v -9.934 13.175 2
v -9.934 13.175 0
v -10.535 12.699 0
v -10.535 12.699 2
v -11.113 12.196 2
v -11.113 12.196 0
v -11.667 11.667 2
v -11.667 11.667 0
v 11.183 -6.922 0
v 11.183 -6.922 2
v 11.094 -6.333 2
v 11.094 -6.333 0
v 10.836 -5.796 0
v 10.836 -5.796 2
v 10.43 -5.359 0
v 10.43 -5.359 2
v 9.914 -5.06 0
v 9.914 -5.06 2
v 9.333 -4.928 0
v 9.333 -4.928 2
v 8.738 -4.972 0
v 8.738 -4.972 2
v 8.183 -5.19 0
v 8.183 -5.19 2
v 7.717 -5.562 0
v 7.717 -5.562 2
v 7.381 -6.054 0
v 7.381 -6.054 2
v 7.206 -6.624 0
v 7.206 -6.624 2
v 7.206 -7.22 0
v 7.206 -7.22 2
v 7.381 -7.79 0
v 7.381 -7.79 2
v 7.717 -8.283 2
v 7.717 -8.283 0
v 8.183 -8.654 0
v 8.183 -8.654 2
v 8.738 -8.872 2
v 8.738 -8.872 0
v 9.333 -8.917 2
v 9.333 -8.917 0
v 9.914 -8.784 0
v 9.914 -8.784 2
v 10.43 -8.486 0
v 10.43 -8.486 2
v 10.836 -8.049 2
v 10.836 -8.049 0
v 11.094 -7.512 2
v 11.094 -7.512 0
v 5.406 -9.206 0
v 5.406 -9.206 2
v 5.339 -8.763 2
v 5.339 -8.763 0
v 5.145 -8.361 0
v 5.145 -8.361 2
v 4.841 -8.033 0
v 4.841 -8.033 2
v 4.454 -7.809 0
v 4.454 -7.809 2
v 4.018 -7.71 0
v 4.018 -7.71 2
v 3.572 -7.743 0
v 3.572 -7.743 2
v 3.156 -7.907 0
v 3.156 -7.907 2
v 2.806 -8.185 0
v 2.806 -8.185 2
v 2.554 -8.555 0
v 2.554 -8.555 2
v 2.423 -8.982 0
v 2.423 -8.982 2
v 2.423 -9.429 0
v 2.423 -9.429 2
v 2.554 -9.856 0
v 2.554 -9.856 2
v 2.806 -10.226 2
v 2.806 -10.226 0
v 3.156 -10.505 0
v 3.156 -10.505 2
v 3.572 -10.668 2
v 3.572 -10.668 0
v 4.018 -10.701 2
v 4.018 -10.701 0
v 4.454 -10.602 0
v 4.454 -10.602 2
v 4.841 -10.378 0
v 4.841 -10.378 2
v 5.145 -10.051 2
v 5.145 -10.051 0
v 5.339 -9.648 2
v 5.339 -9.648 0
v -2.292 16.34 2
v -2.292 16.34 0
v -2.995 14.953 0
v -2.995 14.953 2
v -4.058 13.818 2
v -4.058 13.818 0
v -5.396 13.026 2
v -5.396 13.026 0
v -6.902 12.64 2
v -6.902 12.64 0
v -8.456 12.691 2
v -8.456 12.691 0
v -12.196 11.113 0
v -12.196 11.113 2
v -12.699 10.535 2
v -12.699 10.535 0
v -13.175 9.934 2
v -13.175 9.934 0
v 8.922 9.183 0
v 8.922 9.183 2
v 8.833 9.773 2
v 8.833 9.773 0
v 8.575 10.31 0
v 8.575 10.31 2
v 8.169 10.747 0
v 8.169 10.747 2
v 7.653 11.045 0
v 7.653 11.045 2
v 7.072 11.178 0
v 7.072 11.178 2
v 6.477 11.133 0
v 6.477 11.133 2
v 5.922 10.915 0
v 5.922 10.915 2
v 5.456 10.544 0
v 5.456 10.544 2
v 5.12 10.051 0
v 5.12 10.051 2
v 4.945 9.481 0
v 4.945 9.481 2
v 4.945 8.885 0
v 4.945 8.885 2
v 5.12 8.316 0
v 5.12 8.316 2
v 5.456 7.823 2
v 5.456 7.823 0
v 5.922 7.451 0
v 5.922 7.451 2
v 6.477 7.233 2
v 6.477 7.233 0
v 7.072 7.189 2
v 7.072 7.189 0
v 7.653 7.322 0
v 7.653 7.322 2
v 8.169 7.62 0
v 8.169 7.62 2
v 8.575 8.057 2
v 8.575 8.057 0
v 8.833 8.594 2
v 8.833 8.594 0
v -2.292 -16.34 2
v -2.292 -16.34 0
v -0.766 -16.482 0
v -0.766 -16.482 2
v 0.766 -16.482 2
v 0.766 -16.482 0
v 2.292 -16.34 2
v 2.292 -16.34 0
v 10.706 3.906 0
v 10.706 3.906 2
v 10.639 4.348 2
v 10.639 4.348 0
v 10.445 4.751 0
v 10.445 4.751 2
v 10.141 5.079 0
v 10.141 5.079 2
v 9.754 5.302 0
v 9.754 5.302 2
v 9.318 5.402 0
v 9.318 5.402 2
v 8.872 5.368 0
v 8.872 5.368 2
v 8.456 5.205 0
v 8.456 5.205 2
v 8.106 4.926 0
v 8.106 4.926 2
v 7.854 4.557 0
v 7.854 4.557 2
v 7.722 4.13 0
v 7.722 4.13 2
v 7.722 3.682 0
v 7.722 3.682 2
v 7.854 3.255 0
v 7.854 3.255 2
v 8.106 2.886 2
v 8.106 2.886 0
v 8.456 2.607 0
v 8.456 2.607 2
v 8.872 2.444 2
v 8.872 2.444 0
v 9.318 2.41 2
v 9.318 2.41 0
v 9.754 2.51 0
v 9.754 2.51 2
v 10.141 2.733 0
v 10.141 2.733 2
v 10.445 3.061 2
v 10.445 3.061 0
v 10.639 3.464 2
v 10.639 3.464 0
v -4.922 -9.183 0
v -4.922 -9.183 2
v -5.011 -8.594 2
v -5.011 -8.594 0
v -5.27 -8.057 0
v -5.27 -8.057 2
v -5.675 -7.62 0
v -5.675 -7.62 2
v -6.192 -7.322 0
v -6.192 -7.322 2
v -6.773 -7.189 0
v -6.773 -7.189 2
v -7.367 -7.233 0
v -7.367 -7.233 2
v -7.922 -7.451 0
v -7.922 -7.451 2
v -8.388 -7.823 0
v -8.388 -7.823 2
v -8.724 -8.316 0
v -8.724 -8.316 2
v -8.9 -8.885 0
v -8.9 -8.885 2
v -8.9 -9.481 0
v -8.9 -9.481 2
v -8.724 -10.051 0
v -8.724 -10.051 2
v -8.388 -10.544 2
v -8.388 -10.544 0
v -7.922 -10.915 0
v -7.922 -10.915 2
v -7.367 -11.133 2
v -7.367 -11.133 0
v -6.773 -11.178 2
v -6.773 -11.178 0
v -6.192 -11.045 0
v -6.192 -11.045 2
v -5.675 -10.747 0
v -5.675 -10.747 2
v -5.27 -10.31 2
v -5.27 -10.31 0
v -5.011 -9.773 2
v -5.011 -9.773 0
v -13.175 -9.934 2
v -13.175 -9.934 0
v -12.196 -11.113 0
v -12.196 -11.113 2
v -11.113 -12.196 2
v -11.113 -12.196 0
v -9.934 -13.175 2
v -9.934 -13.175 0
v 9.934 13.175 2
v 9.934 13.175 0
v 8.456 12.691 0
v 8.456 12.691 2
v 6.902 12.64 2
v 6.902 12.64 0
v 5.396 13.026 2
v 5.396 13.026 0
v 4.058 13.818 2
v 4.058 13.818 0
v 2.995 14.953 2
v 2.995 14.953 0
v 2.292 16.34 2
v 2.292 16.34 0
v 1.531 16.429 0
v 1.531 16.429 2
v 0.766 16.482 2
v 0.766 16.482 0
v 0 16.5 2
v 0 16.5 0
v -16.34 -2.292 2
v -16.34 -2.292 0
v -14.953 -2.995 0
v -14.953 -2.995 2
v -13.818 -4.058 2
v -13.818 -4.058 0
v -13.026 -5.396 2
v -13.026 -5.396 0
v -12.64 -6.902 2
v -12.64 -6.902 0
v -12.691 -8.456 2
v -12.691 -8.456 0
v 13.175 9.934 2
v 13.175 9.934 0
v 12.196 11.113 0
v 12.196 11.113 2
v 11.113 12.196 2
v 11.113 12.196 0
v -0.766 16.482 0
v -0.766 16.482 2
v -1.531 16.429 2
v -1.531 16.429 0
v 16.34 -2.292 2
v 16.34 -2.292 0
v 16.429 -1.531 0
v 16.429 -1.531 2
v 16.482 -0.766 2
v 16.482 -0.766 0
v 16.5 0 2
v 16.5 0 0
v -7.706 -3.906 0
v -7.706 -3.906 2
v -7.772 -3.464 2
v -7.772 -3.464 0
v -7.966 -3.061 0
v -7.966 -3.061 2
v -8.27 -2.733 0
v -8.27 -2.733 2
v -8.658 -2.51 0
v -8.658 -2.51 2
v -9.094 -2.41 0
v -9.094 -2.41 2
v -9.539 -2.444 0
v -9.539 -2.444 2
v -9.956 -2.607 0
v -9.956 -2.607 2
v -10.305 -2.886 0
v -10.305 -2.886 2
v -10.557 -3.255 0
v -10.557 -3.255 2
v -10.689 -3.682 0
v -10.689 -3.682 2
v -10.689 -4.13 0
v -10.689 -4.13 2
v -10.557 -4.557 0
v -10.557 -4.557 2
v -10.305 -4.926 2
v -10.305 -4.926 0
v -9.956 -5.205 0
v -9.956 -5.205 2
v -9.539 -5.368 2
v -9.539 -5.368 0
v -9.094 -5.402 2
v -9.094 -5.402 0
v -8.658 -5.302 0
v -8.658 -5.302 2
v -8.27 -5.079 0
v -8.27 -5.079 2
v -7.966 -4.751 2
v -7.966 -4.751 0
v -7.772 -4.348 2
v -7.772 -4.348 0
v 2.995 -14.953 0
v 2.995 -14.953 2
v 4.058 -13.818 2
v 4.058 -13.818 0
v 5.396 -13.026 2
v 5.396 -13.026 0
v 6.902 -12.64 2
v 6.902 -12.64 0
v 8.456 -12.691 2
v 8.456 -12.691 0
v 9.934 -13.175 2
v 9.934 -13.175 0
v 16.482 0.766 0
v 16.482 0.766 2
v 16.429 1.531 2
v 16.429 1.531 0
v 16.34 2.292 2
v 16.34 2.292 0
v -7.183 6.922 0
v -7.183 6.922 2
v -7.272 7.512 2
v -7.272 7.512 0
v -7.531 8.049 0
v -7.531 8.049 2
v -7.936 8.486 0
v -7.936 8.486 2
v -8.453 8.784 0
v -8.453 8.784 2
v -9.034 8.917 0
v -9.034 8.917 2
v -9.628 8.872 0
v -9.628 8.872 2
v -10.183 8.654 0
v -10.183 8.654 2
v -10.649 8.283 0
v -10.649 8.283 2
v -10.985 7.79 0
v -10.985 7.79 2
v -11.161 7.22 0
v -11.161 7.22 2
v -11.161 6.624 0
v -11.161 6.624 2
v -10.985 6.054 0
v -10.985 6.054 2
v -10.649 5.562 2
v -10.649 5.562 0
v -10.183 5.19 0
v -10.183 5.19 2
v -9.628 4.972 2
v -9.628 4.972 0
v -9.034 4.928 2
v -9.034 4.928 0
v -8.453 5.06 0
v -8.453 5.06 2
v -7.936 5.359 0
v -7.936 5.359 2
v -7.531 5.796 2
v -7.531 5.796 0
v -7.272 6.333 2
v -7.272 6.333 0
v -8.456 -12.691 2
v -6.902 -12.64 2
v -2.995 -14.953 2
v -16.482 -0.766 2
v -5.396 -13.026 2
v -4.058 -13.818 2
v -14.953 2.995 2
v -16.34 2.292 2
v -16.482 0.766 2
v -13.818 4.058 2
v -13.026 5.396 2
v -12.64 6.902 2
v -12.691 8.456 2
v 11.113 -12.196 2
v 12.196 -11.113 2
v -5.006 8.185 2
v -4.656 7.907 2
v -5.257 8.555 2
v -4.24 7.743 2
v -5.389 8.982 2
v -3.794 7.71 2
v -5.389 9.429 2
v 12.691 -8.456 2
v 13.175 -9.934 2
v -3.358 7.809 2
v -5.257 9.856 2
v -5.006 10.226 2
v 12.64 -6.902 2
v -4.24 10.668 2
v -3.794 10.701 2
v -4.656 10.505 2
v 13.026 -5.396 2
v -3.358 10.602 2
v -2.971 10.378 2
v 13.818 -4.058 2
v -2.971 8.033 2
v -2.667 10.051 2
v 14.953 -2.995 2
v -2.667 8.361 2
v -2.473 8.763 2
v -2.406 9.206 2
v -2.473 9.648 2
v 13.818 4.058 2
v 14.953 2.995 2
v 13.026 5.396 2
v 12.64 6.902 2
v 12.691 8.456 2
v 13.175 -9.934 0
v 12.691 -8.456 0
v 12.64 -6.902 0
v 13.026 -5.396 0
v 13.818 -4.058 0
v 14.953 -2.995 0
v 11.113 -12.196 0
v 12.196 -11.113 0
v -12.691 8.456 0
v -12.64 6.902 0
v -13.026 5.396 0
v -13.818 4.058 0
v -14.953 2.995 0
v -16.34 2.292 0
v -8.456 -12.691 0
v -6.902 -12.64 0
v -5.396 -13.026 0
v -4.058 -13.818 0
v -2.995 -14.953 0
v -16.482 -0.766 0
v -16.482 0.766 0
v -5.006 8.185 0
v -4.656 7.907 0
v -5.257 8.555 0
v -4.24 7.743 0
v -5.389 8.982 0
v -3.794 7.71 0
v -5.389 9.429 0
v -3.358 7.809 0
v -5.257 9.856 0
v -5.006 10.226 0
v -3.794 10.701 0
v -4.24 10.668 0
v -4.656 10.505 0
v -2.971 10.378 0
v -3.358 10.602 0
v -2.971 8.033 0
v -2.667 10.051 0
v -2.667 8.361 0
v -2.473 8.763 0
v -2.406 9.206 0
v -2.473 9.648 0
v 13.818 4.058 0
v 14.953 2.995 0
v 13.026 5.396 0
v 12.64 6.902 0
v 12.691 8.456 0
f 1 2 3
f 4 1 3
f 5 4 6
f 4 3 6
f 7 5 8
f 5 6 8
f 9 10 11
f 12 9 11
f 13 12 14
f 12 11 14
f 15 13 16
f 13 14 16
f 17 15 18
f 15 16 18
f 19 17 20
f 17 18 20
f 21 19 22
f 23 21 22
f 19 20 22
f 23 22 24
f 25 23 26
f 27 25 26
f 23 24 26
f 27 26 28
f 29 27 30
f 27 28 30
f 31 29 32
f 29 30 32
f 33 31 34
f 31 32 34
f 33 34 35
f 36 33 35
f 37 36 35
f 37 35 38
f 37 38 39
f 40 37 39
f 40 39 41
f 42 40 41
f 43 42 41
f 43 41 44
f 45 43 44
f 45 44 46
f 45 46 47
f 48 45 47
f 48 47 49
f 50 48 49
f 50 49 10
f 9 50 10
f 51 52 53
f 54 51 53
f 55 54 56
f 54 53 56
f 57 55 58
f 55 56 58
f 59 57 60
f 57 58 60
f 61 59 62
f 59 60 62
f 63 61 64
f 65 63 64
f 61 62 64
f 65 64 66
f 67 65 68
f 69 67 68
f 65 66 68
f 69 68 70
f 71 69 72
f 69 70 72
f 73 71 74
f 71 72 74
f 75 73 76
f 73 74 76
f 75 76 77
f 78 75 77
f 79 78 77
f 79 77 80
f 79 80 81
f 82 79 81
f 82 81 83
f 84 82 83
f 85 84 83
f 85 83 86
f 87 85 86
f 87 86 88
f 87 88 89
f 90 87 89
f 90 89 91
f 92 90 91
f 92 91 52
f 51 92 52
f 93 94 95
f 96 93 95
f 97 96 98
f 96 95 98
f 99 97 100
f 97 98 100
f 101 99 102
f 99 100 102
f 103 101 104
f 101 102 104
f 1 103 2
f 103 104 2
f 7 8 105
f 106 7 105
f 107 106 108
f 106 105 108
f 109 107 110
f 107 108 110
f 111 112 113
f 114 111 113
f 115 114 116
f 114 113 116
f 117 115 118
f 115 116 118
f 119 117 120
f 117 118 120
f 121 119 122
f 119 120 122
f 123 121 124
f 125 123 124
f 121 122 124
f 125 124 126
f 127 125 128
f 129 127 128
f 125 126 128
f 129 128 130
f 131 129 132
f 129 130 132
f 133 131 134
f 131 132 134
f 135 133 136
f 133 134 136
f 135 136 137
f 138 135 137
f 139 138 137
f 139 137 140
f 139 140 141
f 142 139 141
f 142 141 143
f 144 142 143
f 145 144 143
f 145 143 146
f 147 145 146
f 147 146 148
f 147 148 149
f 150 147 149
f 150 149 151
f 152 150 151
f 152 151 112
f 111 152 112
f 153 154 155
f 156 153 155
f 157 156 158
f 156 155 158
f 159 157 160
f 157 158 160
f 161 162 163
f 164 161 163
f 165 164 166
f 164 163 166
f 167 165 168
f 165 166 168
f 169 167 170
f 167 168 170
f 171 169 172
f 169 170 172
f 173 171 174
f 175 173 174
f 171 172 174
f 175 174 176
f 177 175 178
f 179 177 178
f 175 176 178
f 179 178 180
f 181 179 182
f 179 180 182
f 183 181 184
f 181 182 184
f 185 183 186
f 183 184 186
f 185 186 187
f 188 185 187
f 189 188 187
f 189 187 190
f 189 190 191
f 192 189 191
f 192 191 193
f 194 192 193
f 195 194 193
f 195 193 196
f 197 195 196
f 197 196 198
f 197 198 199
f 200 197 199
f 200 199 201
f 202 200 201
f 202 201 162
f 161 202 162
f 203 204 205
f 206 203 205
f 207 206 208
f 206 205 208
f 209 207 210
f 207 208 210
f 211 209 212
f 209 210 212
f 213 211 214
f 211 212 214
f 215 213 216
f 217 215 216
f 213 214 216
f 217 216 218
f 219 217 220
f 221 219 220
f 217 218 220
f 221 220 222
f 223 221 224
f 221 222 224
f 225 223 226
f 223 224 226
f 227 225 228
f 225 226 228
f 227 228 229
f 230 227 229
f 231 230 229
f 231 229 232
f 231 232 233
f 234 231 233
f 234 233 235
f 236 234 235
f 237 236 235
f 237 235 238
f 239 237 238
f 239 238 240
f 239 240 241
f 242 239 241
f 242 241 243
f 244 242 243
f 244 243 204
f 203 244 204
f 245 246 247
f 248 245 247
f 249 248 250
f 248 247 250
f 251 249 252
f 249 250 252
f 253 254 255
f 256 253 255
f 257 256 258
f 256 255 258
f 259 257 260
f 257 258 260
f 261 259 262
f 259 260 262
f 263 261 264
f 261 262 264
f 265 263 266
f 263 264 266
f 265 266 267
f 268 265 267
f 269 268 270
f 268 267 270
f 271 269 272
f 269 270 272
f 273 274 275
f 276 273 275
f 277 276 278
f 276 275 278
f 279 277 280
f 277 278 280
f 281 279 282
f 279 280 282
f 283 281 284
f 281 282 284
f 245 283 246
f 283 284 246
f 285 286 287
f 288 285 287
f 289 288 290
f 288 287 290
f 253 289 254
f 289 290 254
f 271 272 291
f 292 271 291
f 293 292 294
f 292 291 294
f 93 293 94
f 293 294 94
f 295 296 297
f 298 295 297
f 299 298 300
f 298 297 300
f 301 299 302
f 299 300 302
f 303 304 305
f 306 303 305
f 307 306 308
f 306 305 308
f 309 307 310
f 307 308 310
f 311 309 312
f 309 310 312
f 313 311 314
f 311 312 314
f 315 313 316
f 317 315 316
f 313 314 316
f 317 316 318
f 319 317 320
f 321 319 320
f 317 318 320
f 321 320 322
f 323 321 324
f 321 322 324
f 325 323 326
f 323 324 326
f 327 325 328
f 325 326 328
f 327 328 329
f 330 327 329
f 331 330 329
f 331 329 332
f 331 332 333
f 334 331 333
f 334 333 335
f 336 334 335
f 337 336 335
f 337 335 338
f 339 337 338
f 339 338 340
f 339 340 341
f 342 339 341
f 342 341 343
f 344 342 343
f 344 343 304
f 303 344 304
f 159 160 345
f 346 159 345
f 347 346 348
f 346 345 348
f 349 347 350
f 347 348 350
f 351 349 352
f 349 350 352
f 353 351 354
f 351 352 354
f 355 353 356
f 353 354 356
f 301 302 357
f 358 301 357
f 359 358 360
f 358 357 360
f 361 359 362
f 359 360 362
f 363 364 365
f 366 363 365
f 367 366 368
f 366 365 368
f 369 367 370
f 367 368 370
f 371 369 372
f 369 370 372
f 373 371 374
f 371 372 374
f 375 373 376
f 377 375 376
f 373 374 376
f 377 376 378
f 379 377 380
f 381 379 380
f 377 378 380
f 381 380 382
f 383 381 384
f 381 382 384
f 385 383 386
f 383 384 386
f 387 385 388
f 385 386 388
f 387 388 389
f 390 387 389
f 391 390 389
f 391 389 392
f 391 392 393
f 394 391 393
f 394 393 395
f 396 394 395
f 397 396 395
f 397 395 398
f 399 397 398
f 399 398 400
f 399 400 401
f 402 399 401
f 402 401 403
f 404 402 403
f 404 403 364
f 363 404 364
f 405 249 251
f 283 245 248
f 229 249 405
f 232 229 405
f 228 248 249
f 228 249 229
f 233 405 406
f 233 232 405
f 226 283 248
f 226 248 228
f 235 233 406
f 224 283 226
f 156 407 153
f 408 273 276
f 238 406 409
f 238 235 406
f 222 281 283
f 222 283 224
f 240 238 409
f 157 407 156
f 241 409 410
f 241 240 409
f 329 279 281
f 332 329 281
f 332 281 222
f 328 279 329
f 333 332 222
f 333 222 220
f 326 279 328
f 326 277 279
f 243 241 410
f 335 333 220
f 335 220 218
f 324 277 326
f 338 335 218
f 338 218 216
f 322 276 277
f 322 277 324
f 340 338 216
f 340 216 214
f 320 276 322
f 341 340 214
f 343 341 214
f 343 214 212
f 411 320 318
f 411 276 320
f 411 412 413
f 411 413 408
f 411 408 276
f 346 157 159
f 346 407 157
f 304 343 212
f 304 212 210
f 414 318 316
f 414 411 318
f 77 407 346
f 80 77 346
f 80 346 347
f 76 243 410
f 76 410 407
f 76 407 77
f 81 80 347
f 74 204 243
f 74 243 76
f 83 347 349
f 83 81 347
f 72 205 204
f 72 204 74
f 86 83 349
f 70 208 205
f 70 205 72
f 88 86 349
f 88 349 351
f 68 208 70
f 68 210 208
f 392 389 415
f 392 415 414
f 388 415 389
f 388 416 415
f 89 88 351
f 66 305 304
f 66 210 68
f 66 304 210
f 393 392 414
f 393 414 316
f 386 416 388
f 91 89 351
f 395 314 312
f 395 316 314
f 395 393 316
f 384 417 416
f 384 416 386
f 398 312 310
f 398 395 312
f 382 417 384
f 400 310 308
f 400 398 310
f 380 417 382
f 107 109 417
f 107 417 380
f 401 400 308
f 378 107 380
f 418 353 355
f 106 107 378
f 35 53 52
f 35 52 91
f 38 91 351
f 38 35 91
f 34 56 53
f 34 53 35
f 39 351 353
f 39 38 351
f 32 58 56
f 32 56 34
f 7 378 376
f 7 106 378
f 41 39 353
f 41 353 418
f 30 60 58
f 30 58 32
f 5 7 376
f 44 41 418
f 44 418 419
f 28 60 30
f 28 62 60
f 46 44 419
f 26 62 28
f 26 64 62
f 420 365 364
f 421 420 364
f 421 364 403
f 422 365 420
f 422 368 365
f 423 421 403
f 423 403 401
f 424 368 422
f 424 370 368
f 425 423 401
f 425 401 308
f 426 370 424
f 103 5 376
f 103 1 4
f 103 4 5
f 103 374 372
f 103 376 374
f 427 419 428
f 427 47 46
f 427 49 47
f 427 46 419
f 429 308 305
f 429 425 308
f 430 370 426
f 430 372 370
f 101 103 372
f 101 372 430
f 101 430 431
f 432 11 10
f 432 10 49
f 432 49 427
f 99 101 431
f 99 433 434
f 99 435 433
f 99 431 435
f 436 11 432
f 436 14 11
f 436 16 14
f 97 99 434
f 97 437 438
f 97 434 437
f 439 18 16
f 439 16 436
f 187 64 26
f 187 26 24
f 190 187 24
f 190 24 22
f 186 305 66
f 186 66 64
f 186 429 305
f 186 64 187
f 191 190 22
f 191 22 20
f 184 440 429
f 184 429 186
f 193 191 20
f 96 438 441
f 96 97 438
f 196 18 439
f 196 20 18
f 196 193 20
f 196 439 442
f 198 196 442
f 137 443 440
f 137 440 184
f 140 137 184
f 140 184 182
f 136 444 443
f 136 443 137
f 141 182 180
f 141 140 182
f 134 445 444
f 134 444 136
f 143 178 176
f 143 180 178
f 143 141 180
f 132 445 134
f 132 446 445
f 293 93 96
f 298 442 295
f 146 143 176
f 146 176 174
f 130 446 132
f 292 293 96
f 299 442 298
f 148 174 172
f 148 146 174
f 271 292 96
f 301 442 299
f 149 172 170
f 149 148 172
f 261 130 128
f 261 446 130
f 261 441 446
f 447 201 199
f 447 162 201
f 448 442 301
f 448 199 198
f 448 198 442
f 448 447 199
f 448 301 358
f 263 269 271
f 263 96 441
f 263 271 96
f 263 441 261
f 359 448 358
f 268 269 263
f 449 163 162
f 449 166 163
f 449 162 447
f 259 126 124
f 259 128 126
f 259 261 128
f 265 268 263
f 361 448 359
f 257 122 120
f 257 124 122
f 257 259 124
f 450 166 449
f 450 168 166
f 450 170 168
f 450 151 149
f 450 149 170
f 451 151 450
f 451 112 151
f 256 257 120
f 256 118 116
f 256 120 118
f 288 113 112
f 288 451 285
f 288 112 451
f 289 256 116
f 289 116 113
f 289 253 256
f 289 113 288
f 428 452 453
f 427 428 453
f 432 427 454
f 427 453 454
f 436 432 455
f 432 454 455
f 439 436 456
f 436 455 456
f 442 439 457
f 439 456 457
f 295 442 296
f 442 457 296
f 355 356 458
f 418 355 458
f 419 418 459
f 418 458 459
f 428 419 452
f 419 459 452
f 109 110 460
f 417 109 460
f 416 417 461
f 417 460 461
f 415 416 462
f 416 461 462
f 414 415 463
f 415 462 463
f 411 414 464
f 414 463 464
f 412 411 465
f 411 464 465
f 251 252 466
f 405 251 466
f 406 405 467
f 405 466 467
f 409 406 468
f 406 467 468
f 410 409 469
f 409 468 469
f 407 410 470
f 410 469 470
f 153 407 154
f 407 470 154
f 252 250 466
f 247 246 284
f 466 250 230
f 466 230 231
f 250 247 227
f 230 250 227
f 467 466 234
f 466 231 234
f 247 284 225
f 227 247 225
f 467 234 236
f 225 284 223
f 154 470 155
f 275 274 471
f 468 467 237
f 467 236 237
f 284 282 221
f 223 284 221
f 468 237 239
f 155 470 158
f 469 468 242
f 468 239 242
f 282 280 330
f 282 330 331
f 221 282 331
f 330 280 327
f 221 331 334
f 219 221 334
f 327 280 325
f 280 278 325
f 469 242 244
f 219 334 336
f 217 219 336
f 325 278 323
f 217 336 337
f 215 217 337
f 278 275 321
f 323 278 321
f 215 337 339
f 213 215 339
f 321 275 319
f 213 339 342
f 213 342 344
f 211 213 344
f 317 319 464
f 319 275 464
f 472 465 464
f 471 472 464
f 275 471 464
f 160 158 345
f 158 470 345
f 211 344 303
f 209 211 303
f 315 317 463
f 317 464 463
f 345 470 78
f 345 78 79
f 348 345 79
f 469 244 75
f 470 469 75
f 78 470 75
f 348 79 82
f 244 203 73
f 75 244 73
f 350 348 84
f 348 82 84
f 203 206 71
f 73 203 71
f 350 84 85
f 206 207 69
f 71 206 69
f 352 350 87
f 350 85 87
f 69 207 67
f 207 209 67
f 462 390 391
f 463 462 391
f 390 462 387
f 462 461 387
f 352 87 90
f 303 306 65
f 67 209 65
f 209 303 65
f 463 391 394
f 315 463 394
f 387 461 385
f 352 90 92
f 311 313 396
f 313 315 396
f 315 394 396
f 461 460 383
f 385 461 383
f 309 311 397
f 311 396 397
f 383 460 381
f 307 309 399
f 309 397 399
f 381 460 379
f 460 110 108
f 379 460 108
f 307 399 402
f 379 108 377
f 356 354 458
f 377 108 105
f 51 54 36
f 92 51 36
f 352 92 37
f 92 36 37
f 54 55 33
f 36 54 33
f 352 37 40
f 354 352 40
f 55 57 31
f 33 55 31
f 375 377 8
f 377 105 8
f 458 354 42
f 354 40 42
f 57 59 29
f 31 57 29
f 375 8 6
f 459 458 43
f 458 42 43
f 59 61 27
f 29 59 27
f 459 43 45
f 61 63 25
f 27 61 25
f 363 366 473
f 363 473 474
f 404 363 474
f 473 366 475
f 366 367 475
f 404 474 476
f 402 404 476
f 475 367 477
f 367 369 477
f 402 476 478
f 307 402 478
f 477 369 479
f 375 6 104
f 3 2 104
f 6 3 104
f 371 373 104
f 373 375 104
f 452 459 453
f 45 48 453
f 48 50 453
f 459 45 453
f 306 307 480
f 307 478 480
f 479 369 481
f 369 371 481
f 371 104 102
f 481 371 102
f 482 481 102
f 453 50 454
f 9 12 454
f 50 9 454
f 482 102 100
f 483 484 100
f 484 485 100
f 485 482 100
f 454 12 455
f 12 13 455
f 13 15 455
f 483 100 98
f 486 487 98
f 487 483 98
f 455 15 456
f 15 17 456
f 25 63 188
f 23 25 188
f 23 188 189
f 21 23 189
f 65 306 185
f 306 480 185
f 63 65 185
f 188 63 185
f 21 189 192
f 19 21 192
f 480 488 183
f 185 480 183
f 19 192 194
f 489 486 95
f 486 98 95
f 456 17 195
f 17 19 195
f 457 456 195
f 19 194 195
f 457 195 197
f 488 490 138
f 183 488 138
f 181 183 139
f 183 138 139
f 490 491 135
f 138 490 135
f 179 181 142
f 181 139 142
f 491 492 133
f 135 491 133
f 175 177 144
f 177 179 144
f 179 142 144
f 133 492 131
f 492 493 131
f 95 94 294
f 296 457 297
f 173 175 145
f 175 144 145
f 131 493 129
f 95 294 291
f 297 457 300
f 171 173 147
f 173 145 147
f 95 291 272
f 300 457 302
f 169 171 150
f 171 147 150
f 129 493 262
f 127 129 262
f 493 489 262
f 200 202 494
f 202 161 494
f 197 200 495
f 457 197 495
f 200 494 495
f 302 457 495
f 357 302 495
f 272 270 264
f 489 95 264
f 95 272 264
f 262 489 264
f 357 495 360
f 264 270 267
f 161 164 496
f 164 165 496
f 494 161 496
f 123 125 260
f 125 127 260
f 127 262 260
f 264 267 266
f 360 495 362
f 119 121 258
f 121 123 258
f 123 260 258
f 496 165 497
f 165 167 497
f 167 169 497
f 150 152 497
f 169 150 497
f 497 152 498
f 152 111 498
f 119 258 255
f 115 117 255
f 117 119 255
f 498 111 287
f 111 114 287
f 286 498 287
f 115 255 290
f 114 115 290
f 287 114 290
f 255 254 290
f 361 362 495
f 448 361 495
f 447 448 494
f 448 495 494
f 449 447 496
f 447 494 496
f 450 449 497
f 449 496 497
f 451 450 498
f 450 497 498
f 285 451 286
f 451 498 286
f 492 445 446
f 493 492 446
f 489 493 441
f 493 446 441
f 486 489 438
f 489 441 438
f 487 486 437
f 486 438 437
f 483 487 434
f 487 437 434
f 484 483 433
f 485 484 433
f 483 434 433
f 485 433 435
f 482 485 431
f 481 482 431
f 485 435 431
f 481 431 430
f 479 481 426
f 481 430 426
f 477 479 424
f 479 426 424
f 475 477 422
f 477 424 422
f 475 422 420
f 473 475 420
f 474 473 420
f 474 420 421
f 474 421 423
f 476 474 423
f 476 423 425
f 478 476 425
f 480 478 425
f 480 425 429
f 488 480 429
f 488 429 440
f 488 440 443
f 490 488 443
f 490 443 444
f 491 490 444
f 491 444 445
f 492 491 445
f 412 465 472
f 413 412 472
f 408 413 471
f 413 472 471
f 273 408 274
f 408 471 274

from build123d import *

# Parameters (mm, degrees)
BOSS_EXTRUDE1_DEPTH = 2
SKETCH2_R           = 1.5
SKETCH2_R_2         = 2
CUT_EXTRUDE1_DEPTH  = 24.420076857


with BuildPart() as part:
    # Sketch1 → Boss-Extrude1 (new body)
    with BuildSketch(Plane.XY):
        with BuildLine():
            ThreePointArc((2.29187449, 16.340052366), (0, 16.5), (-2.29187449, 16.340052366))
            ThreePointArc((-2.29187449, 16.340052366), (-5.395608595, 13.026151447), (-9.933561839, 13.174761826))
            ThreePointArc((-9.933561839, 13.174761826), (-11.66726189, 11.66726189), (-13.174761826, 9.933561839))
            ThreePointArc((-13.174761826, 9.933561839), (-13.026151447, 5.395608595), (-16.340052366, 2.29187449))
            ThreePointArc((-16.340052366, 2.29187449), (-16.5, 0), (-16.340052366, -2.29187449))
            ThreePointArc((-16.340052366, -2.29187449), (-13.026151447, -5.395608595), (-13.174761826, -9.933561839))
            ThreePointArc((-13.174761826, -9.933561839), (-11.66726189, -11.66726189), (-9.933561839, -13.174761826))
            ThreePointArc((-9.933561839, -13.174761826), (-5.395608595, -13.026151447), (-2.29187449, -16.340052366))
            ThreePointArc((-2.29187449, -16.340052366), (0, -16.5), (2.29187449, -16.340052366))
            ThreePointArc((2.29187449, -16.340052366), (5.395608595, -13.026151447), (9.933561839, -13.174761826))
            ThreePointArc((9.933561839, -13.174761826), (11.66726189, -11.66726189), (13.174761826, -9.933561839))
            ThreePointArc((13.174761826, -9.933561839), (13.026151447, -5.395608595), (16.340052366, -2.29187449))
            ThreePointArc((16.340052366, -2.29187449), (16.5, 0), (16.340052366, 2.29187449))
            ThreePointArc((16.340052366, 2.29187449), (13.026151447, 5.395608595), (13.174761826, 9.933561839))
            ThreePointArc((13.174761826, 9.933561839), (11.66726189, 11.66726189), (9.933561839, 13.174761826))
            ThreePointArc((9.933561839, 13.174761826), (5.395608595, 13.026151447), (2.29187449, 16.340052366))
        make_face()
    extrude(amount=BOSS_EXTRUDE1_DEPTH)

    # Sketch2 → Cut-Extrude1 (cut, through all)
    with BuildSketch(Plane.XY.offset(2)):
        with Locations((9.205631104, 3.905938552)):
            Circle(SKETCH2_R)
        with Locations((6.922242286, 9.183276198)):
            Circle(SKETCH2_R_2)
        with Locations((9.183276198, -6.922242286)):
            Circle(SKETCH2_R_2)
        with Locations((3.905938552, -9.205631104)):
            Circle(SKETCH2_R)
        with Locations((-6.922242286, -9.183276198)):
            Circle(SKETCH2_R_2)
        with Locations((-9.205631104, -3.905938552)):
            Circle(SKETCH2_R)
        with Locations((-9.183276198, 6.922242286)):
            Circle(SKETCH2_R_2)
        with Locations((-3.905938552, 9.205631104)):
            Circle(SKETCH2_R)
    extrude(amount=-CUT_EXTRUDE1_DEPTH, mode=Mode.SUBTRACT)


solid = part.part
